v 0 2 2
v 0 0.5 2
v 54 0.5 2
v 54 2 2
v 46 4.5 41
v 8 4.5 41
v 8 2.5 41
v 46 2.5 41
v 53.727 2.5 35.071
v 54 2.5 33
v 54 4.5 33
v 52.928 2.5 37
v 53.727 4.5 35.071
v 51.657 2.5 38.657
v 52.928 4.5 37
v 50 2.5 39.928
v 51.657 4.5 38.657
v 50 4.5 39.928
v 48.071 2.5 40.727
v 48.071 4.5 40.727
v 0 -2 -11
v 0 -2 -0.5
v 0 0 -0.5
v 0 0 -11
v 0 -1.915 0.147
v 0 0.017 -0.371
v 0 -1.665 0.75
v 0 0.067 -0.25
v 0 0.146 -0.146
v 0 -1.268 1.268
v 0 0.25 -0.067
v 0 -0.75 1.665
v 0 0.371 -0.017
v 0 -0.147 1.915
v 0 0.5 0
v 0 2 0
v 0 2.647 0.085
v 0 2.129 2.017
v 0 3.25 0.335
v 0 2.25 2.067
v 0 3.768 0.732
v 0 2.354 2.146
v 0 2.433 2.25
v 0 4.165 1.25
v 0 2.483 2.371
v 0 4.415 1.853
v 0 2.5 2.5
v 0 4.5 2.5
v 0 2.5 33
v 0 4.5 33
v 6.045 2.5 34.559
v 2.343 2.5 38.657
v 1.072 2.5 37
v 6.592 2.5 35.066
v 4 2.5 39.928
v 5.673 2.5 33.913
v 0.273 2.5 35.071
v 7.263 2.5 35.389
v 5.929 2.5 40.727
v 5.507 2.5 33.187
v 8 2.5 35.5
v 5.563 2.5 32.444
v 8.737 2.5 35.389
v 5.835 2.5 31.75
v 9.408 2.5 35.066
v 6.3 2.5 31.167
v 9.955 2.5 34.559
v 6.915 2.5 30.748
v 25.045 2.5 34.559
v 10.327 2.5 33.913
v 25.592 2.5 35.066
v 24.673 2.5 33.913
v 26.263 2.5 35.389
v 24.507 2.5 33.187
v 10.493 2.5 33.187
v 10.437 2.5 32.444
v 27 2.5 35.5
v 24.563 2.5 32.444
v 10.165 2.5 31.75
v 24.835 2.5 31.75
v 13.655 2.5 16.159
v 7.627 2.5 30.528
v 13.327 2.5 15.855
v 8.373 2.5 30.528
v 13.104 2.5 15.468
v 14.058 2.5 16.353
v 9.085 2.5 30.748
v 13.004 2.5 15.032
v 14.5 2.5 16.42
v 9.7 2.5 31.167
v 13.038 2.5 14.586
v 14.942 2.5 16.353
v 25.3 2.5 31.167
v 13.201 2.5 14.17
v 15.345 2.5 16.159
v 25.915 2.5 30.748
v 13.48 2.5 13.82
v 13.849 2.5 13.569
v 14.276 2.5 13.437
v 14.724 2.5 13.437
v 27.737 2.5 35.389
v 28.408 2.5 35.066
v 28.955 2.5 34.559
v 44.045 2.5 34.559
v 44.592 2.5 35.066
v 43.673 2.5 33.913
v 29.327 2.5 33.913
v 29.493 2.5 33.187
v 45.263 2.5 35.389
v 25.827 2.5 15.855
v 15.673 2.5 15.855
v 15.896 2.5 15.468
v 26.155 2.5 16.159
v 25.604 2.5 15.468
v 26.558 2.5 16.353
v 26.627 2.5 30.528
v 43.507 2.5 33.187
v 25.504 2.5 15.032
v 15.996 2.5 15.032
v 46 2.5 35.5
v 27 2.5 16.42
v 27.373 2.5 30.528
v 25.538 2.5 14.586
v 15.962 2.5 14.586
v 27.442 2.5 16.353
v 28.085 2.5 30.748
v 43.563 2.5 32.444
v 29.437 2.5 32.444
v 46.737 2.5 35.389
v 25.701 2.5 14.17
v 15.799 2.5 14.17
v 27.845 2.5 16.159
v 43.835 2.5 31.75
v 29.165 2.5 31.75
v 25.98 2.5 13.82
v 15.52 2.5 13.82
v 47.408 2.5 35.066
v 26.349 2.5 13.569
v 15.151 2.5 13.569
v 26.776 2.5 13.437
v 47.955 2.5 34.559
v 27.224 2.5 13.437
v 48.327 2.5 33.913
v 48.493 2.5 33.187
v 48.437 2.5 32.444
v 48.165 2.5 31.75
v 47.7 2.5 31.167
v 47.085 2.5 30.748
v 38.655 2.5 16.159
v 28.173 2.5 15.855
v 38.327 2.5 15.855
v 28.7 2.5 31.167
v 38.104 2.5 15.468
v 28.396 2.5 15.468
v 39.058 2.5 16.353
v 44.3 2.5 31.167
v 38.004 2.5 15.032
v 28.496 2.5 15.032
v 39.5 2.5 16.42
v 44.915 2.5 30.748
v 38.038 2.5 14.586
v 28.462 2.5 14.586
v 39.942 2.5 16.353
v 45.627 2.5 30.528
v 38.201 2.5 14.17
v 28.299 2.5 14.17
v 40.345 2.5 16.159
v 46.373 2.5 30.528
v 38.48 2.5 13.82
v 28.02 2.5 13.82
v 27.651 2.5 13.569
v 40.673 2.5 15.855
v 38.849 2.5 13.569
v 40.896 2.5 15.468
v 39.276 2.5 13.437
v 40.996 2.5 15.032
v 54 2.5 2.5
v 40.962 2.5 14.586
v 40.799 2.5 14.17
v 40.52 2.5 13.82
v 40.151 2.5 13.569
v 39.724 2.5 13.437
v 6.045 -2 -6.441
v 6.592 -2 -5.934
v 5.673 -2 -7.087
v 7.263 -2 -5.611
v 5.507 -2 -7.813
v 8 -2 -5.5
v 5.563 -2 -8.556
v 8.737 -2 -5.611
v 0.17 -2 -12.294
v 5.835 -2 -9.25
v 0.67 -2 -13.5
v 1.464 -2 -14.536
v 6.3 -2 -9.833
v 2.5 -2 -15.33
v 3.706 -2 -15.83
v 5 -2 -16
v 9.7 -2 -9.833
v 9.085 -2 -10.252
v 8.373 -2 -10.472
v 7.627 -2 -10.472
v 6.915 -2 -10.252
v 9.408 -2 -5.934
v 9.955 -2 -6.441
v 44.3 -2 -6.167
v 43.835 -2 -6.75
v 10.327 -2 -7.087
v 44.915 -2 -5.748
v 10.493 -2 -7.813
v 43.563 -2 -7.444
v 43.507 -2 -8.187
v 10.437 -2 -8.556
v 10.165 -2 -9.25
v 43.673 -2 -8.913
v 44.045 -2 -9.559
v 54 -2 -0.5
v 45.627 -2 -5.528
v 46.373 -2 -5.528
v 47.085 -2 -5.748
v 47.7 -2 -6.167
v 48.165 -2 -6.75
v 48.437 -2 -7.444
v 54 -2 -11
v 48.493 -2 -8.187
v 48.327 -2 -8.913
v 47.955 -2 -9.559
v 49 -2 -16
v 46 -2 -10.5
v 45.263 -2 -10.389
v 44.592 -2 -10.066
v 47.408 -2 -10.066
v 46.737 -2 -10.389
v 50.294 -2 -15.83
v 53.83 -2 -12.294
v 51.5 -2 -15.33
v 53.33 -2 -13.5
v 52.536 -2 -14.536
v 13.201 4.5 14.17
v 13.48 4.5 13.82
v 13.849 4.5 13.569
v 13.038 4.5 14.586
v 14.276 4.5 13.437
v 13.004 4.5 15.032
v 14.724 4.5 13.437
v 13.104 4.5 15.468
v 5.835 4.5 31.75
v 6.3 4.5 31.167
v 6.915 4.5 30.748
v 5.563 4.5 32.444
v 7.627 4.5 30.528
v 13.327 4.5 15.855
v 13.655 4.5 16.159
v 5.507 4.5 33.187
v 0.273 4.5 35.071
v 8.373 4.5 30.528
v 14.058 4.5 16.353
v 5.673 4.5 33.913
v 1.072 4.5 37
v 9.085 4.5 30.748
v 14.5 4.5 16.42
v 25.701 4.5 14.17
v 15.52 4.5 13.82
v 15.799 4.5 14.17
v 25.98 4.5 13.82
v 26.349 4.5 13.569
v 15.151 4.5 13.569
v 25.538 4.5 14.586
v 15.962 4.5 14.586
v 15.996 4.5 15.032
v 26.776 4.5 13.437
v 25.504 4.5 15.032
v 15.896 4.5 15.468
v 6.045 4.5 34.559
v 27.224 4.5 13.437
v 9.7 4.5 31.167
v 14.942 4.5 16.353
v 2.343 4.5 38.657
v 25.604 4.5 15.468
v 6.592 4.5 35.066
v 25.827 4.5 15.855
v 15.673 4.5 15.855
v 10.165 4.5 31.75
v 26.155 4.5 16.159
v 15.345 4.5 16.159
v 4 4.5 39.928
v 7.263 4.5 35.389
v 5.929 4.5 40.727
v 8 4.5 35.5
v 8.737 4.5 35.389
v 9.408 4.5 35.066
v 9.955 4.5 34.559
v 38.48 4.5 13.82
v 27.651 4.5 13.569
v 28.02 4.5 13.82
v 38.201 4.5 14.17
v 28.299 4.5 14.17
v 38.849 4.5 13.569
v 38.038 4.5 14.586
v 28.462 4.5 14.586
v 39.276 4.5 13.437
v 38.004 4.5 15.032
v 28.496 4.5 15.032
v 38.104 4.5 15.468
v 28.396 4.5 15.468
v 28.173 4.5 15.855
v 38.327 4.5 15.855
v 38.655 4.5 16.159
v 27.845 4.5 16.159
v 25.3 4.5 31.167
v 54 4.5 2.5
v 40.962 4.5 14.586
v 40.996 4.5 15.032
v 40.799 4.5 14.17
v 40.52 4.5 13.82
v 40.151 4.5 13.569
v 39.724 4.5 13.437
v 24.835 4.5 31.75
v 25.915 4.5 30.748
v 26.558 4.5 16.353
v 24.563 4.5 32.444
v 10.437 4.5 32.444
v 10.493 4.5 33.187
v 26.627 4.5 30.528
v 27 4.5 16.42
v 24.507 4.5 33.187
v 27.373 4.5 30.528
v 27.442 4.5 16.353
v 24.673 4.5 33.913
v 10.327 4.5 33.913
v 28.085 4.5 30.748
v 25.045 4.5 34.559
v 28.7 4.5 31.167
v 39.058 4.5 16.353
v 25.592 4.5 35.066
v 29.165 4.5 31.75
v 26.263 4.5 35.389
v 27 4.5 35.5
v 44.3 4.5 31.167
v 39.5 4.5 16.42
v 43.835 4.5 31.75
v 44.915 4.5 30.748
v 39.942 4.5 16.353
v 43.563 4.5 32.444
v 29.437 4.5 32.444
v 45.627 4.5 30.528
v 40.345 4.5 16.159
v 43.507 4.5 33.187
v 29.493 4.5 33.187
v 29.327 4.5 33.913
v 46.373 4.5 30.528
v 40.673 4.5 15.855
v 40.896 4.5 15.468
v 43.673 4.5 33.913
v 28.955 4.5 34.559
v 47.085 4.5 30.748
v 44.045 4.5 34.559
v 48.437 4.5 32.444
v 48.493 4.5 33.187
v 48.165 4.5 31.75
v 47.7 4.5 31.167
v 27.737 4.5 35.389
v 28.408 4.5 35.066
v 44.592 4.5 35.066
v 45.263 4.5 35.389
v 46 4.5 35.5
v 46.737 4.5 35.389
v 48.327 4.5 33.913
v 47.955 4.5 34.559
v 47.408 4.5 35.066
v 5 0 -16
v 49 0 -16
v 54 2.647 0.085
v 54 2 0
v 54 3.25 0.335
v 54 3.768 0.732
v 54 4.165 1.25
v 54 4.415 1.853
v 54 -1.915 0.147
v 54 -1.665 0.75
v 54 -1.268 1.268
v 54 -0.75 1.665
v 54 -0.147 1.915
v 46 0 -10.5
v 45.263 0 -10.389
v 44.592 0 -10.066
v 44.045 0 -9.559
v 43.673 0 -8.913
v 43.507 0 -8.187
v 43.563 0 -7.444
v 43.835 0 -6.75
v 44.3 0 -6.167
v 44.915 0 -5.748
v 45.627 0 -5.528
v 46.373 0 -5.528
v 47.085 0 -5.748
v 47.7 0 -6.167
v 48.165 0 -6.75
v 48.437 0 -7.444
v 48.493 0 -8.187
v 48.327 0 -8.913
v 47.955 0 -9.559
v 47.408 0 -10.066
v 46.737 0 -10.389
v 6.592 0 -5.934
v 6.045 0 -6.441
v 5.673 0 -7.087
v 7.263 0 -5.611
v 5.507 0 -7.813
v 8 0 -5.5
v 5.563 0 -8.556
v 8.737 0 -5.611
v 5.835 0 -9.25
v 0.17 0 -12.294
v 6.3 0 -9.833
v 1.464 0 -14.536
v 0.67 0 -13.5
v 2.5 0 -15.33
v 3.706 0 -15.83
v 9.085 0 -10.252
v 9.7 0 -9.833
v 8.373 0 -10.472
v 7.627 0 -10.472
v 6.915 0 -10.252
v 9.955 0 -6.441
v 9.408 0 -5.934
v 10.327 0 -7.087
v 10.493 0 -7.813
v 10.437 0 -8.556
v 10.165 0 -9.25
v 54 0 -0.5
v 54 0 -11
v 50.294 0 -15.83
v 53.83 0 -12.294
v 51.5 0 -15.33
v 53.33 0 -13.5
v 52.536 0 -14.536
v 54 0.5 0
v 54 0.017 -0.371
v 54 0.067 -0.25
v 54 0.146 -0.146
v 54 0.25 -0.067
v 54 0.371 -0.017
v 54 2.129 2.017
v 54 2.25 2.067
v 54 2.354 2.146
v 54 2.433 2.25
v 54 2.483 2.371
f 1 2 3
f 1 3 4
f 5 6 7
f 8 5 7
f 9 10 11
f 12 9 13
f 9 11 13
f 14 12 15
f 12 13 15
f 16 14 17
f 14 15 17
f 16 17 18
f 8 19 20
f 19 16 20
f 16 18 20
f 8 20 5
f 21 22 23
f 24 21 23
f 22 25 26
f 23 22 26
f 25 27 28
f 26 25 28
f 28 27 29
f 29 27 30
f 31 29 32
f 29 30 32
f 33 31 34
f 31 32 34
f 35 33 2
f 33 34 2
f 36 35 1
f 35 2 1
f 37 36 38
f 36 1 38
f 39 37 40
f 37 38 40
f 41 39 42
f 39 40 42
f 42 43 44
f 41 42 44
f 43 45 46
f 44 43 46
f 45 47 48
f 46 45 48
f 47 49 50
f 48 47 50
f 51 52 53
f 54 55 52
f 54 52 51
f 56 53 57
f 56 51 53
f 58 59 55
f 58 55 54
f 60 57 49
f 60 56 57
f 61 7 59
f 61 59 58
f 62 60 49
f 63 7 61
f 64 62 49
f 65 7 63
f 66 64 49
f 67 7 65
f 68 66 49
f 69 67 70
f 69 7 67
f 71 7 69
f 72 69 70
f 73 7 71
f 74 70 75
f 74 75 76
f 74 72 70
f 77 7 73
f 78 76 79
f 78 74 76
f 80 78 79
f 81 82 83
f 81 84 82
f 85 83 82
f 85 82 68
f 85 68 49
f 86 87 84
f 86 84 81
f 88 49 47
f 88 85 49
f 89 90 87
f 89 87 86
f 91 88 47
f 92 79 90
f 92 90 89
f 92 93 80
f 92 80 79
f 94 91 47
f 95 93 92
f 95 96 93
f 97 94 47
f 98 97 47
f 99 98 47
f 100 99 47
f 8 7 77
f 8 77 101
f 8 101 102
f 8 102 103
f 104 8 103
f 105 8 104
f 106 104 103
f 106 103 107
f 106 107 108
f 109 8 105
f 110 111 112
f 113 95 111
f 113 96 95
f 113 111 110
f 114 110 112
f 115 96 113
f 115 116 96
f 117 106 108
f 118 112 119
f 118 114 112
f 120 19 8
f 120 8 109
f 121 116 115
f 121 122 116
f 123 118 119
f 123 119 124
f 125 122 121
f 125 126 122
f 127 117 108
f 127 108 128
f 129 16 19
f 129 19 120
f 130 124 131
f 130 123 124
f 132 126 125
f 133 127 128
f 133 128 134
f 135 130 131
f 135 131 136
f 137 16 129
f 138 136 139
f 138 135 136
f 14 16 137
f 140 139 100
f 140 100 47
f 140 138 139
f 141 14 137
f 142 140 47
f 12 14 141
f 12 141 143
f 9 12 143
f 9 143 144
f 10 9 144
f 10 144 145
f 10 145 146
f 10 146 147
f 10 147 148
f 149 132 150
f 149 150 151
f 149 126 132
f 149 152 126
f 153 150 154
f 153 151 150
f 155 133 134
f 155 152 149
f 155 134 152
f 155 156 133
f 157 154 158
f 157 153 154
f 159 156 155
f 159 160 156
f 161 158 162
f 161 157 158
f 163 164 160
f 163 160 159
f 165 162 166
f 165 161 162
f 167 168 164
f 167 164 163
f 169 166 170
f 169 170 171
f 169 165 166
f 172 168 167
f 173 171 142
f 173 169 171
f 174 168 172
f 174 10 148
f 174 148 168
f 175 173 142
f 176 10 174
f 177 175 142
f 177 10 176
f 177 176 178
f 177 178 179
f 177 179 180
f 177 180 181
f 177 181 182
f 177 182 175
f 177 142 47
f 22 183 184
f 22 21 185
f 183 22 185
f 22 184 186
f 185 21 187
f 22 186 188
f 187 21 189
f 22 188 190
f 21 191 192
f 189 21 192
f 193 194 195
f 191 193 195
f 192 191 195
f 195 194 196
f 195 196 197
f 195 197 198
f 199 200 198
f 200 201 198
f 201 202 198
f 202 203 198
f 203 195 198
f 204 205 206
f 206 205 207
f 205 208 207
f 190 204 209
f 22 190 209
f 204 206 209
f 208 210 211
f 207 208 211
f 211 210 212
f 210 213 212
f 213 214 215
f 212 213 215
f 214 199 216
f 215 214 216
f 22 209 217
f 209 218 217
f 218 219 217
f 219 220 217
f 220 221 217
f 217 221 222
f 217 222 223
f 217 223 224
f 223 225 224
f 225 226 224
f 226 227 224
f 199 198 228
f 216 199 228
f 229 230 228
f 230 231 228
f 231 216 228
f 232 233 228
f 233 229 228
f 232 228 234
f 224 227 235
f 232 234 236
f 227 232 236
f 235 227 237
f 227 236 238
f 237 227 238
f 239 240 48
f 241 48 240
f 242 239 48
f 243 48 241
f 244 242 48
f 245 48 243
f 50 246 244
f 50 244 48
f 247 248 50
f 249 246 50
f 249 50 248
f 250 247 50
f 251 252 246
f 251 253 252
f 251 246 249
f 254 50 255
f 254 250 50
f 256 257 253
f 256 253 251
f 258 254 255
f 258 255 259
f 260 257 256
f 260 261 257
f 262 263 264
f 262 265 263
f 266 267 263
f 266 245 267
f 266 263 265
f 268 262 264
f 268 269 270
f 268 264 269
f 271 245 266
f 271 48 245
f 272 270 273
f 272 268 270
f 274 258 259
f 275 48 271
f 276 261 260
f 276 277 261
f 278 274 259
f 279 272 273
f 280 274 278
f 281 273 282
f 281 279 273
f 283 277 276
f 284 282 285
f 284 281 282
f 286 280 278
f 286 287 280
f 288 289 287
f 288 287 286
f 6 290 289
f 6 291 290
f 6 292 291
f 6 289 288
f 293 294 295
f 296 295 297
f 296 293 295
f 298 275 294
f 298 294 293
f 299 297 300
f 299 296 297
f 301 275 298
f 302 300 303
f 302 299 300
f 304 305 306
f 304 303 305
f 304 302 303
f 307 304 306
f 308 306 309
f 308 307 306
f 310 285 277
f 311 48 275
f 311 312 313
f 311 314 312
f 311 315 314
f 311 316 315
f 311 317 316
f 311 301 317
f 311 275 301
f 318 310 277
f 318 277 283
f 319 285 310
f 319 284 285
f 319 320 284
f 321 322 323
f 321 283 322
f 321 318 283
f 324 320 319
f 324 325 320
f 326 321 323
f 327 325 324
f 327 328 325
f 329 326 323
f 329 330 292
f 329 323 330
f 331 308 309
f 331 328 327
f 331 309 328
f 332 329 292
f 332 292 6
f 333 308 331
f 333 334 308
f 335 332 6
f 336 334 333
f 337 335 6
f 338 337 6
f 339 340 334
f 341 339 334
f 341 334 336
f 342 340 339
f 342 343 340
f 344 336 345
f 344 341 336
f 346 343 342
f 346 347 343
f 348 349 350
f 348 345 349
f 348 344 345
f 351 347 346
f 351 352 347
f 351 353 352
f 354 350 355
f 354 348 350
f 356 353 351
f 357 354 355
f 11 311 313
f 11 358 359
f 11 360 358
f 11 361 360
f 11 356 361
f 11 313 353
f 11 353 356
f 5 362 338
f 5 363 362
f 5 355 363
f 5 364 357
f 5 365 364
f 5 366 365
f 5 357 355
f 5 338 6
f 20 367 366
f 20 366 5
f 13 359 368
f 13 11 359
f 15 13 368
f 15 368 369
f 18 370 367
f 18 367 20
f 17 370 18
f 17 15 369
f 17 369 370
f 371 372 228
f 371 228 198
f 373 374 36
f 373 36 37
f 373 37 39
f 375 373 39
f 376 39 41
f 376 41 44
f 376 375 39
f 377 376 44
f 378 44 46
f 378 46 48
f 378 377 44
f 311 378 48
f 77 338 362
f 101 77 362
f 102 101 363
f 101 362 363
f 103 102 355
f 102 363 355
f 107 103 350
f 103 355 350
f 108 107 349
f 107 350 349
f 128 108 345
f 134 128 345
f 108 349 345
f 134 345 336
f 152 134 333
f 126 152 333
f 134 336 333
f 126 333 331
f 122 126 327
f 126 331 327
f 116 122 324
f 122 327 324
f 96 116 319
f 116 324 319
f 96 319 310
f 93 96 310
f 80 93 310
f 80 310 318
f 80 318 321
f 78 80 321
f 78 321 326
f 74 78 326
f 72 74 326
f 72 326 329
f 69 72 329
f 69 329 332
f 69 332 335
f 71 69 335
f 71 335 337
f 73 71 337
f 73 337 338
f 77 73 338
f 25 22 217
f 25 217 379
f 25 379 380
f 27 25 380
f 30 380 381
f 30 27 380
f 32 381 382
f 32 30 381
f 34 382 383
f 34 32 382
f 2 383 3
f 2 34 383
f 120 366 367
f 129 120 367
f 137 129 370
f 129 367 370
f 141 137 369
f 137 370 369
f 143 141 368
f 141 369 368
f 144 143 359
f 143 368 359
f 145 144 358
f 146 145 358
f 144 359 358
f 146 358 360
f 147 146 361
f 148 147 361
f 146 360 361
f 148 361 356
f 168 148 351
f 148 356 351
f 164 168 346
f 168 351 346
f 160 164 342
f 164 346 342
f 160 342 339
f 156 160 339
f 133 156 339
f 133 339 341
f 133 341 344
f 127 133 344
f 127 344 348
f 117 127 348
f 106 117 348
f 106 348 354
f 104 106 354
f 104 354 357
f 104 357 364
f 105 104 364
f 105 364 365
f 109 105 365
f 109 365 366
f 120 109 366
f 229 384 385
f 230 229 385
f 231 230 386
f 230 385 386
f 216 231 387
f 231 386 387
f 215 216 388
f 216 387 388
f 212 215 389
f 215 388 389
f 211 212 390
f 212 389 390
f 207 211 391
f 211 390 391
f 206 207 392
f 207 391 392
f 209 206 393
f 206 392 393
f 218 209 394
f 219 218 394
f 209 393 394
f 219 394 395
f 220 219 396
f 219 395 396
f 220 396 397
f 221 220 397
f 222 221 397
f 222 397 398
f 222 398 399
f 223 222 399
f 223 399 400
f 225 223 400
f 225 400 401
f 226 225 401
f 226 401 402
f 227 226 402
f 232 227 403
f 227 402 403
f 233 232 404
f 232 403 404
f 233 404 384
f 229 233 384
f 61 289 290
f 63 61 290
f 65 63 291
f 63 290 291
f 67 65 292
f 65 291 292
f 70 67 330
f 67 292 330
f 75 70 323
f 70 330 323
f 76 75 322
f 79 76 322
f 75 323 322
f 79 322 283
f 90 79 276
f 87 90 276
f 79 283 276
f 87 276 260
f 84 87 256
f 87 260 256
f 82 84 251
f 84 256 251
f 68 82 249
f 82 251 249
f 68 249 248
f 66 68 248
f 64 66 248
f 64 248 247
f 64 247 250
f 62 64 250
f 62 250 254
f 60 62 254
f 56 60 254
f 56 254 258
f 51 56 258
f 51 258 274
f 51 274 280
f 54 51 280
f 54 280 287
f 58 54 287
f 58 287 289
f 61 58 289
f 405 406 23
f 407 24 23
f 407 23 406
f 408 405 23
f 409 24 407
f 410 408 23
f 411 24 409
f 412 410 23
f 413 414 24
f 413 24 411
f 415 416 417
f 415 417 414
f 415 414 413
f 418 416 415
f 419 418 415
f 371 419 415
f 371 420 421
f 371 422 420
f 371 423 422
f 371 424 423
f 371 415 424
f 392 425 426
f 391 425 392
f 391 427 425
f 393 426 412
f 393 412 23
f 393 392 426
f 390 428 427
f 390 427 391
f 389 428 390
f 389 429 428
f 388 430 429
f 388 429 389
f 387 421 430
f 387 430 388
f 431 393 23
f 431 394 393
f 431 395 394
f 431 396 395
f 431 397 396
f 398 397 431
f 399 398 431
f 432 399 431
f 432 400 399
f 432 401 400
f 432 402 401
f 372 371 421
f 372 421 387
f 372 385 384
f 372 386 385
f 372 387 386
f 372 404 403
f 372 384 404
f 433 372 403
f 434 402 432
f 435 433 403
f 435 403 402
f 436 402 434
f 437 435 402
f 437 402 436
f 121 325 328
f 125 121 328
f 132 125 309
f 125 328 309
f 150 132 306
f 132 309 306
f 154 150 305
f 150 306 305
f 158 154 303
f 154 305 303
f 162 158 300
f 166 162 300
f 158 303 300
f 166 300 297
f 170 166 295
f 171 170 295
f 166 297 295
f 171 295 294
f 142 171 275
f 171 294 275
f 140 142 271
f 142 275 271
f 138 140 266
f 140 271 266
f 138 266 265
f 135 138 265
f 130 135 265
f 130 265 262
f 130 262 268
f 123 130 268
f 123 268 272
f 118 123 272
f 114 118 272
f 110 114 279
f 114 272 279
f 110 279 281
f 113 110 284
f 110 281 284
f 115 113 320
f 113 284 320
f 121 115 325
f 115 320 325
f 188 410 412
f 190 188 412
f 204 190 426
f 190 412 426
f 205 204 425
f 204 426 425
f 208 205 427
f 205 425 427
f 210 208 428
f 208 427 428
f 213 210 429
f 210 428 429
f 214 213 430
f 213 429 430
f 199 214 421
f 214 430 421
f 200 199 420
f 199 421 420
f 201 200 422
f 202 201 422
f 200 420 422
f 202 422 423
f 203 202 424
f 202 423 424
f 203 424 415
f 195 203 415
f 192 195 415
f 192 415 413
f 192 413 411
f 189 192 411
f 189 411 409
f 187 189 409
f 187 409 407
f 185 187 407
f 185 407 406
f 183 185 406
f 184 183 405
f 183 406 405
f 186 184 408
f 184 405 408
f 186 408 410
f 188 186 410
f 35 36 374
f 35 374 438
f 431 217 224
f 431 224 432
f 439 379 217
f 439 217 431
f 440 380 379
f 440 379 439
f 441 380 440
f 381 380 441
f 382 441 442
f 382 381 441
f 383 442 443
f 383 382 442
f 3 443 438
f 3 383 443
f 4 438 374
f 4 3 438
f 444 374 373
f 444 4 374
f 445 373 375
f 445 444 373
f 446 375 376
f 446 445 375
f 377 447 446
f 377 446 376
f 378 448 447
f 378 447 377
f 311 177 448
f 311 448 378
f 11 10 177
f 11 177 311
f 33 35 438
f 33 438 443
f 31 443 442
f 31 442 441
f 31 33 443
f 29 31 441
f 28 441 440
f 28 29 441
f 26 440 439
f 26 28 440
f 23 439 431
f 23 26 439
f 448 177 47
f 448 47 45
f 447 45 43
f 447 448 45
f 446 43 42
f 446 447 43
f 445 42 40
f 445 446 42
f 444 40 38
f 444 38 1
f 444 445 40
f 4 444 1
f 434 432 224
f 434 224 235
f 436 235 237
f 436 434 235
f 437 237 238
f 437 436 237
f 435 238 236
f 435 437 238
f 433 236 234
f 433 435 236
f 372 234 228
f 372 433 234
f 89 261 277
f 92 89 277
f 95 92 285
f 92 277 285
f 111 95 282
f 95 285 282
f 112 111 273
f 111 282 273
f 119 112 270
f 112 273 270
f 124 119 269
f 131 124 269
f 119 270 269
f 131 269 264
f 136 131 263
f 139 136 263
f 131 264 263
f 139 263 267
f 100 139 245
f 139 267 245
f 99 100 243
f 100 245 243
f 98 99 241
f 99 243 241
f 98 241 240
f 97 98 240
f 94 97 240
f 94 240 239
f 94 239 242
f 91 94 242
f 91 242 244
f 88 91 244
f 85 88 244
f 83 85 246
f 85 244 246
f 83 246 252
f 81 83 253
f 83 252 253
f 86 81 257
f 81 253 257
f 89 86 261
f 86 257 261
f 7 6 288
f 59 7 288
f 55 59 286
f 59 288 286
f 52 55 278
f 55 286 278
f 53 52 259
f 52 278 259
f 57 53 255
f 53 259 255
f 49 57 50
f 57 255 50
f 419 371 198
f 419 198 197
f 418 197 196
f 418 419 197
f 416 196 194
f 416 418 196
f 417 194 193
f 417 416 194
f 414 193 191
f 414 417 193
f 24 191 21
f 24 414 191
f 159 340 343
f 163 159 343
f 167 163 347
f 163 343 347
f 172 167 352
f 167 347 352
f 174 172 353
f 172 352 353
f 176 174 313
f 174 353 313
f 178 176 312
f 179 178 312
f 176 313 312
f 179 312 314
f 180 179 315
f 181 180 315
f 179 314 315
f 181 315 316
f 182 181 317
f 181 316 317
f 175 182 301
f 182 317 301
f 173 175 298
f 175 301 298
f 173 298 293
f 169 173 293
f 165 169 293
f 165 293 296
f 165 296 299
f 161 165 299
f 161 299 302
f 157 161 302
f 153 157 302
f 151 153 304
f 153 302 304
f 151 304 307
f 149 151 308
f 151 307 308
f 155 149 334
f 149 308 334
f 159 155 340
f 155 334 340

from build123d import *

# Parameters (mm, degrees)
SKETCH1_R                    = 2.5
BASE_FLANGE1_DEPTH           = 2
EDGE_FLANGE1_STRIP_W         = 9
EDGE_FLANGE1_STRIP_H         = 2
EDGE_FLANGE1_STRIP_CUT_DEPTH = 54
EDGE_FLANGE1_DEPTH           = 54
EDGE_FLANGE2_DEPTH           = 54
SKETCH25_R                   = 2.5
CUT_EXTRUDE1_DEPTH           = 69.112040052
SKETCH26_R                   = 1.5
CUT_EXTRUDE2_DEPTH           = 2


# Sheet-metal steps are written as plain solids
with BuildPart() as part:
    # Sketch1 → Base-Flange1 (new body)
    with BuildSketch(Plane(origin=(0, 0, 0), x_dir=(1, 0, 0), z_dir=(0, 1, 0))):
        with BuildLine():
            Line((0, 0), (54, 0))
            Line((54, 0), (54, 11))
            ThreePointArc((54, 11), (52.535533906, 14.535533906), (49, 16))
            Line((49, 16), (5, 16))
            ThreePointArc((5, 16), (1.464466094, 14.535533906), (0, 11))
            Line((0, 11), (0, 0))
        make_face()
        with Locations(Location((8, 8, 0), (0, 0, 270))):
            Circle(SKETCH1_R, mode=Mode.SUBTRACT)
        with Locations(Location((46, 8, 0), (0, 0, 90))):
            Circle(SKETCH1_R, mode=Mode.SUBTRACT)
    extrude(amount=-BASE_FLANGE1_DEPTH)

    # Edge-Flange1 strip (across the edge) → Edge-Flange1 strip cut (cut)
    with BuildSketch(Plane(origin=(0, 0, 0), x_dir=(0, 0, -1), z_dir=(1, 0, 0))):
        with Locations((-4, -1)):
            Rectangle(EDGE_FLANGE1_STRIP_W, EDGE_FLANGE1_STRIP_H)
    extrude(amount=EDGE_FLANGE1_STRIP_CUT_DEPTH, mode=Mode.SUBTRACT)

    # Edge-Flange1 section (across the edge) → Edge-Flange1 (add)
    with BuildSketch(Plane(origin=(0, 0, 0), x_dir=(0, 0, -1), z_dir=(1, 0, 0))):
        with BuildLine():
            Line((-2, 0.5), (-2, 2))
            Line((-2, 2), (0, 2))
            Line((0, 2), (0, 0.5))
            ThreePointArc((0, 0.5), (0.146446609, 0.146446609), (0.5, 0))
            Line((0.5, 0), (0.5, -2))
            ThreePointArc((0.5, -2), (-1.267766953, -1.267766953), (-2, 0.5))
        make_face()
    extrude(amount=EDGE_FLANGE1_DEPTH)

    # Edge-Flange2 section (across the edge) → Edge-Flange2 (add)
    with BuildSketch(Plane(origin=(54, 2.5, 2), x_dir=(0, -1, 0), z_dir=(-1, 0, 0))):
        with BuildLine():
            Line((-2, 0.5), (-2, 39))
            Line((-2, 39), (0, 39))
            Line((0, 39), (0, 0.5))
            ThreePointArc((0, 0.5), (0.146446609, 0.146446609), (0.5, 0))
            Line((0.5, 0), (0.5, -2))
            ThreePointArc((0.5, -2), (-1.267766953, -1.267766953), (-2, 0.5))
        make_face()
    extrude(amount=EDGE_FLANGE2_DEPTH)

    # Sketch25 → Cut-Extrude1 (cut, through all)
    with BuildSketch(Plane(origin=(0, 4.5, 0), x_dir=(1, 0, 0), z_dir=(0, 1, 0))):
        with Locations(Location((27, -33, 0), (0, 0, 270))):
            Circle(SKETCH25_R)
        with Locations(Location((8, -33, 0), (0, 0, 270))):
            Circle(SKETCH25_R)
        with BuildLine():
            ThreePointArc((8, -41), (2.343145751, -38.656854249), (0, -33))
            Line((0, -33), (0, -41))
            Line((0, -41), (8, -41))
        make_face()
        with Locations(Location((46, -33, 0), (0, 0, 270))):
            Circle(SKETCH25_R)
        with BuildLine():
            Line((54, -41), (54, -33))
            ThreePointArc((54, -33), (51.656854249, -38.656854249), (46, -41))
            Line((46, -41), (54, -41))
        make_face()
    extrude(amount=-CUT_EXTRUDE1_DEPTH, mode=Mode.SUBTRACT)

    # Sketch26 → Cut-Extrude2 (cut)
    with BuildSketch(Plane(origin=(0, 4.5, 0), x_dir=(1, 0, 0), z_dir=(0, 1, 0))):
        with Locations(Location((39.5, -14.92, 0), (0, 0, 270))):
            Circle(SKETCH26_R)
        with Locations(Location((27, -14.92, 0), (0, 0, 270))):
            Circle(SKETCH26_R)
        with Locations(Location((14.5, -14.92, 0), (0, 0, 270))):
            Circle(SKETCH26_R)
    extrude(amount=-CUT_EXTRUDE2_DEPTH, mode=Mode.SUBTRACT)


solid = part.part
